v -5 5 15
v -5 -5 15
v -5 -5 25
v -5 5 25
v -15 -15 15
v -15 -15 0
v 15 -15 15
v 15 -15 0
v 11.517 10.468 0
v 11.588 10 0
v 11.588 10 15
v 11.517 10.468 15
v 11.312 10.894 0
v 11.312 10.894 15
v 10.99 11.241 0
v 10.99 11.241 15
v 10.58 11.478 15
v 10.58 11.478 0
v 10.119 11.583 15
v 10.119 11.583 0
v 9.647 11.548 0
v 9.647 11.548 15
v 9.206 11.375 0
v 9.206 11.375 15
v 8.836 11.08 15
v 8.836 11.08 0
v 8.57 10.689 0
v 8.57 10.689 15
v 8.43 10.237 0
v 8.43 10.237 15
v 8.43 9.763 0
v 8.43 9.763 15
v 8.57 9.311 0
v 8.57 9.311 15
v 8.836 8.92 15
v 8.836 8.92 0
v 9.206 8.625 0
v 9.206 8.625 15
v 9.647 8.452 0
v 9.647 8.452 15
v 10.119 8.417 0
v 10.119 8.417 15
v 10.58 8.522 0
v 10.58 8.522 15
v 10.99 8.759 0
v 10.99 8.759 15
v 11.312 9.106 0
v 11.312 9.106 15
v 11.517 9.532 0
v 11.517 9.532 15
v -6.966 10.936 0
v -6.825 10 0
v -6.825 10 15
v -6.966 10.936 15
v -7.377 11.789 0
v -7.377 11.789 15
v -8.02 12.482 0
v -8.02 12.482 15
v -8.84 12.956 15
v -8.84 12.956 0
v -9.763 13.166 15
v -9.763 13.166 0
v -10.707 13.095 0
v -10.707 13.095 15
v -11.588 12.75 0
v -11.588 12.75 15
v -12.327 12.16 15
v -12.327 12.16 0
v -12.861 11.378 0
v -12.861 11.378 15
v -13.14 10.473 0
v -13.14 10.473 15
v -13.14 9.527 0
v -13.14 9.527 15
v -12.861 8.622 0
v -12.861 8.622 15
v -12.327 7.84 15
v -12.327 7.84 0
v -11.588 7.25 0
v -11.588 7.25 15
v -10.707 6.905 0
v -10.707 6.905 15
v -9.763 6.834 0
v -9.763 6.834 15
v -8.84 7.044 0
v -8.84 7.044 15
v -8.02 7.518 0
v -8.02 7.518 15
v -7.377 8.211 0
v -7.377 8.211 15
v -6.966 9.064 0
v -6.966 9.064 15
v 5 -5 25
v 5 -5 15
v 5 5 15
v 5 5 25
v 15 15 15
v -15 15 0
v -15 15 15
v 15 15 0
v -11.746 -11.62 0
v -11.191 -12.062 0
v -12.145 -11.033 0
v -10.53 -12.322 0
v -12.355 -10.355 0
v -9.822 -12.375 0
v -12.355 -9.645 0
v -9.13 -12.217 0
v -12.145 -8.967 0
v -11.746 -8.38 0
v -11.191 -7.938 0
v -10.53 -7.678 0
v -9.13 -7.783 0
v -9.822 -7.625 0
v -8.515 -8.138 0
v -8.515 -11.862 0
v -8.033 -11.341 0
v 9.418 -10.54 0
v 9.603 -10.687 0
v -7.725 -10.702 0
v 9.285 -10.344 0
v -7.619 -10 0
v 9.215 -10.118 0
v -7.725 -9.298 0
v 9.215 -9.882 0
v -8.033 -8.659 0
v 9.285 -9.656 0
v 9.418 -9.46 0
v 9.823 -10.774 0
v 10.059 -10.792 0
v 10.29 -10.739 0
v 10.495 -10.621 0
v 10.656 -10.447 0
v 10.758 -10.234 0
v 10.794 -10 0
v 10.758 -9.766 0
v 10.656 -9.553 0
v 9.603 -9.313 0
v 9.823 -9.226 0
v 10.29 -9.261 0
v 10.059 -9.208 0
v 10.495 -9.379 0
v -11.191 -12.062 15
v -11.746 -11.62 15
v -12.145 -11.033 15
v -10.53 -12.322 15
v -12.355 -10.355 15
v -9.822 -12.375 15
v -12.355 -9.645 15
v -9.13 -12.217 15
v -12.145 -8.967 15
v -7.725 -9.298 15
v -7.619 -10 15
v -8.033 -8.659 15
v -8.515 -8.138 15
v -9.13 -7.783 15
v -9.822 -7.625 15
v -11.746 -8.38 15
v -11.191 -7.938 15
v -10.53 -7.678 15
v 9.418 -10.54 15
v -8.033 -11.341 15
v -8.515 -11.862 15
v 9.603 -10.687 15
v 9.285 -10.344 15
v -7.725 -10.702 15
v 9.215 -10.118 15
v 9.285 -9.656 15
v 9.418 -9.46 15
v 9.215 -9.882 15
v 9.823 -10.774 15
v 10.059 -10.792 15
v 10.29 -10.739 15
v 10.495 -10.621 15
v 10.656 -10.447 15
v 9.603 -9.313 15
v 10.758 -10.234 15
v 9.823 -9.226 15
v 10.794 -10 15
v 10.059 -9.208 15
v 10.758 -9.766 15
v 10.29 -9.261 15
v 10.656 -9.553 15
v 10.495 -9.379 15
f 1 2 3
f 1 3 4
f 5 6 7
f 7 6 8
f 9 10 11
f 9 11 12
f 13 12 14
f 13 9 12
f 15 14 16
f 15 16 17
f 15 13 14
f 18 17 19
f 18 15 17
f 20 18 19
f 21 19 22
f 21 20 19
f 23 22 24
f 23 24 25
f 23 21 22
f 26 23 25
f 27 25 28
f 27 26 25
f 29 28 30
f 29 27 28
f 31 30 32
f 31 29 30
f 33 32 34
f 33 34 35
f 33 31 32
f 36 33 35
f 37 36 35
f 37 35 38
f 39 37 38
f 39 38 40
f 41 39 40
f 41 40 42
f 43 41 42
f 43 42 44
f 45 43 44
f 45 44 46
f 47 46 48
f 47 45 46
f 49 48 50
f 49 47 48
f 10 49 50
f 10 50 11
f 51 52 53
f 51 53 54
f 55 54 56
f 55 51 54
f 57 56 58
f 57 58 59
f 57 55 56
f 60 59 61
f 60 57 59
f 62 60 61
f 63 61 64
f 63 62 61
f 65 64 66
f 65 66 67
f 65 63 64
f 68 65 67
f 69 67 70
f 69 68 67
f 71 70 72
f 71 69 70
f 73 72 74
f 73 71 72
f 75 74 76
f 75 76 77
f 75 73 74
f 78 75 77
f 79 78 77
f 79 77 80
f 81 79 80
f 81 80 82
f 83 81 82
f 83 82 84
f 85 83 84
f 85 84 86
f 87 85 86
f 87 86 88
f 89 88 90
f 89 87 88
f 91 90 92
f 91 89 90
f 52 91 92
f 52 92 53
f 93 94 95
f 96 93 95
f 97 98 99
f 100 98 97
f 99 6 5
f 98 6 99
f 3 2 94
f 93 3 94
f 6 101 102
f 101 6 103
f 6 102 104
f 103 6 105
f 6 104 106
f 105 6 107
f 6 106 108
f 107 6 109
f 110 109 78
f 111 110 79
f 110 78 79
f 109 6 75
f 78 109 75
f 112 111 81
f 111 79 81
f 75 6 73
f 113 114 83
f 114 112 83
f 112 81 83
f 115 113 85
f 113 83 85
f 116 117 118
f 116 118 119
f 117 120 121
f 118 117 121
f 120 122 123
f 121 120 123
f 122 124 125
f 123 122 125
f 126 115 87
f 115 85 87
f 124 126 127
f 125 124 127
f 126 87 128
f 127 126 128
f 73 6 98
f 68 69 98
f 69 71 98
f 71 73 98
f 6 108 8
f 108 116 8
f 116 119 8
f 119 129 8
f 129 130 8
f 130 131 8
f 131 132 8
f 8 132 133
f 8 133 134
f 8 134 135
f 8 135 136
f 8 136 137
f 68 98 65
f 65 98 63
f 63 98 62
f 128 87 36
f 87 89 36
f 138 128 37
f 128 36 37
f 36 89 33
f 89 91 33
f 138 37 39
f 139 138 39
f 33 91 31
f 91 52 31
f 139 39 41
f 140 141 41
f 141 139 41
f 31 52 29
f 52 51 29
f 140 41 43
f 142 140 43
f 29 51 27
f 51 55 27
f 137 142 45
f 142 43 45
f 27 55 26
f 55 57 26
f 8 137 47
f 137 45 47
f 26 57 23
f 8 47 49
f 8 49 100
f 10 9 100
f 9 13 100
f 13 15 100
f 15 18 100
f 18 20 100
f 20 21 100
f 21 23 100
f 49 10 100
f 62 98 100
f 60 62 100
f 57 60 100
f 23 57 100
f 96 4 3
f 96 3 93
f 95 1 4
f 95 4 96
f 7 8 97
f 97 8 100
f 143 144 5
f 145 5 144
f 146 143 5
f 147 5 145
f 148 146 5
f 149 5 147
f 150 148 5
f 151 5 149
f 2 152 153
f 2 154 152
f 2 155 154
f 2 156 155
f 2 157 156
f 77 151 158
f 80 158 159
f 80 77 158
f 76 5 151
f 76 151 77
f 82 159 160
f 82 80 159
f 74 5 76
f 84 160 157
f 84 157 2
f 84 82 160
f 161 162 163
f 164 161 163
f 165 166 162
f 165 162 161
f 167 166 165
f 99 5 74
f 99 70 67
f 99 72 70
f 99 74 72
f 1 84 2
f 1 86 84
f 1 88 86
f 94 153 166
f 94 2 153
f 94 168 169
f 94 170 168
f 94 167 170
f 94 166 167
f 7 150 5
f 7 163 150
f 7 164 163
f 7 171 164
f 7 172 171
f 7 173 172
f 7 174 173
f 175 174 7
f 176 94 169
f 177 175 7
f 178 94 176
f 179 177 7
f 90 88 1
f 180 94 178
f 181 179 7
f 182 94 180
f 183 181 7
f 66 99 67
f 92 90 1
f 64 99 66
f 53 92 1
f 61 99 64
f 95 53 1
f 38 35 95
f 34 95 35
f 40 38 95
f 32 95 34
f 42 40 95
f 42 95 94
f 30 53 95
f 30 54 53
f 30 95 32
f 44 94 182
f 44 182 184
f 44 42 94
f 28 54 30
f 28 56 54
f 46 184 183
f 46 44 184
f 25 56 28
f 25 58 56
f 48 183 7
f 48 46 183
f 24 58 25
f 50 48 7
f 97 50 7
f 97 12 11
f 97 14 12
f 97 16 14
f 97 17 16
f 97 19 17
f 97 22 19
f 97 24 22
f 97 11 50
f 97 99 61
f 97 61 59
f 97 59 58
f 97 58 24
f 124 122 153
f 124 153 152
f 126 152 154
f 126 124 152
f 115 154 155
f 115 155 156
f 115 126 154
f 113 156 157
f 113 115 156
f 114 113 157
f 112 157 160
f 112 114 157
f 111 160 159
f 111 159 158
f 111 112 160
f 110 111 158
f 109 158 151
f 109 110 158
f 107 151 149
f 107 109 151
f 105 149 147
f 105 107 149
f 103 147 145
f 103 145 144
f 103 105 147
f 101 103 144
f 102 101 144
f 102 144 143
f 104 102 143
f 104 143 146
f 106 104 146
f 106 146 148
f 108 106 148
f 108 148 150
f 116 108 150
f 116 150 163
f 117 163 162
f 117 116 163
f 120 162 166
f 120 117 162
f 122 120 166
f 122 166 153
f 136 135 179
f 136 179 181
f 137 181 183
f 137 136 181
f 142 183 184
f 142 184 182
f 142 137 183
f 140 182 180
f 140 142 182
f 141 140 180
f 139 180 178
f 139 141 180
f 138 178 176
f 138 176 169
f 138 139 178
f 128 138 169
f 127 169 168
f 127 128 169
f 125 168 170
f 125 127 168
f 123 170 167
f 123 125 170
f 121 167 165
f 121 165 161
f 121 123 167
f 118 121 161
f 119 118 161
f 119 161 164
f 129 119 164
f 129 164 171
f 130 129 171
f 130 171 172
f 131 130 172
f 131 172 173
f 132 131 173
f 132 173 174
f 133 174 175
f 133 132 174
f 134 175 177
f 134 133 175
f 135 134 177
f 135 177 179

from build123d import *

# Parameters (mm, degrees)
F0_W     = 30
F0_H     = 30
F0_R     = 2.38125
F0_R_2   = 0.79375
F0_R_3   = 3.175
F0_W_2   = 10
F0_H_2   = 10
F0_R_4   = 1.5875
F1_DEPTH = 15
F2_DEPTH = 25


with BuildPart() as f1:
    # F0 (on Top) → F1 (new body)
    with BuildSketch(Plane.XY):
        Rectangle(F0_W, F0_H)
        with Locations((-10, -10)):
            Circle(F0_R, mode=Mode.SUBTRACT)
        with Locations((10, -10)):
            Circle(F0_R_2, mode=Mode.SUBTRACT)
        with Locations((-10, 10)):
            Circle(F0_R_3, mode=Mode.SUBTRACT)
        Rectangle(F0_W_2, F0_H_2, mode=Mode.SUBTRACT)
        with Locations((10, 10)):
            Circle(F0_R_4, mode=Mode.SUBTRACT)
        Rectangle(F0_W_2, F0_H_2)
    extrude(amount=F1_DEPTH)

    # F0 (on Top) → F2 (join)
    with BuildSketch(Plane.XY):
        Rectangle(F0_W_2, F0_H_2)
    extrude(amount=F2_DEPTH)


solid = f1.part
